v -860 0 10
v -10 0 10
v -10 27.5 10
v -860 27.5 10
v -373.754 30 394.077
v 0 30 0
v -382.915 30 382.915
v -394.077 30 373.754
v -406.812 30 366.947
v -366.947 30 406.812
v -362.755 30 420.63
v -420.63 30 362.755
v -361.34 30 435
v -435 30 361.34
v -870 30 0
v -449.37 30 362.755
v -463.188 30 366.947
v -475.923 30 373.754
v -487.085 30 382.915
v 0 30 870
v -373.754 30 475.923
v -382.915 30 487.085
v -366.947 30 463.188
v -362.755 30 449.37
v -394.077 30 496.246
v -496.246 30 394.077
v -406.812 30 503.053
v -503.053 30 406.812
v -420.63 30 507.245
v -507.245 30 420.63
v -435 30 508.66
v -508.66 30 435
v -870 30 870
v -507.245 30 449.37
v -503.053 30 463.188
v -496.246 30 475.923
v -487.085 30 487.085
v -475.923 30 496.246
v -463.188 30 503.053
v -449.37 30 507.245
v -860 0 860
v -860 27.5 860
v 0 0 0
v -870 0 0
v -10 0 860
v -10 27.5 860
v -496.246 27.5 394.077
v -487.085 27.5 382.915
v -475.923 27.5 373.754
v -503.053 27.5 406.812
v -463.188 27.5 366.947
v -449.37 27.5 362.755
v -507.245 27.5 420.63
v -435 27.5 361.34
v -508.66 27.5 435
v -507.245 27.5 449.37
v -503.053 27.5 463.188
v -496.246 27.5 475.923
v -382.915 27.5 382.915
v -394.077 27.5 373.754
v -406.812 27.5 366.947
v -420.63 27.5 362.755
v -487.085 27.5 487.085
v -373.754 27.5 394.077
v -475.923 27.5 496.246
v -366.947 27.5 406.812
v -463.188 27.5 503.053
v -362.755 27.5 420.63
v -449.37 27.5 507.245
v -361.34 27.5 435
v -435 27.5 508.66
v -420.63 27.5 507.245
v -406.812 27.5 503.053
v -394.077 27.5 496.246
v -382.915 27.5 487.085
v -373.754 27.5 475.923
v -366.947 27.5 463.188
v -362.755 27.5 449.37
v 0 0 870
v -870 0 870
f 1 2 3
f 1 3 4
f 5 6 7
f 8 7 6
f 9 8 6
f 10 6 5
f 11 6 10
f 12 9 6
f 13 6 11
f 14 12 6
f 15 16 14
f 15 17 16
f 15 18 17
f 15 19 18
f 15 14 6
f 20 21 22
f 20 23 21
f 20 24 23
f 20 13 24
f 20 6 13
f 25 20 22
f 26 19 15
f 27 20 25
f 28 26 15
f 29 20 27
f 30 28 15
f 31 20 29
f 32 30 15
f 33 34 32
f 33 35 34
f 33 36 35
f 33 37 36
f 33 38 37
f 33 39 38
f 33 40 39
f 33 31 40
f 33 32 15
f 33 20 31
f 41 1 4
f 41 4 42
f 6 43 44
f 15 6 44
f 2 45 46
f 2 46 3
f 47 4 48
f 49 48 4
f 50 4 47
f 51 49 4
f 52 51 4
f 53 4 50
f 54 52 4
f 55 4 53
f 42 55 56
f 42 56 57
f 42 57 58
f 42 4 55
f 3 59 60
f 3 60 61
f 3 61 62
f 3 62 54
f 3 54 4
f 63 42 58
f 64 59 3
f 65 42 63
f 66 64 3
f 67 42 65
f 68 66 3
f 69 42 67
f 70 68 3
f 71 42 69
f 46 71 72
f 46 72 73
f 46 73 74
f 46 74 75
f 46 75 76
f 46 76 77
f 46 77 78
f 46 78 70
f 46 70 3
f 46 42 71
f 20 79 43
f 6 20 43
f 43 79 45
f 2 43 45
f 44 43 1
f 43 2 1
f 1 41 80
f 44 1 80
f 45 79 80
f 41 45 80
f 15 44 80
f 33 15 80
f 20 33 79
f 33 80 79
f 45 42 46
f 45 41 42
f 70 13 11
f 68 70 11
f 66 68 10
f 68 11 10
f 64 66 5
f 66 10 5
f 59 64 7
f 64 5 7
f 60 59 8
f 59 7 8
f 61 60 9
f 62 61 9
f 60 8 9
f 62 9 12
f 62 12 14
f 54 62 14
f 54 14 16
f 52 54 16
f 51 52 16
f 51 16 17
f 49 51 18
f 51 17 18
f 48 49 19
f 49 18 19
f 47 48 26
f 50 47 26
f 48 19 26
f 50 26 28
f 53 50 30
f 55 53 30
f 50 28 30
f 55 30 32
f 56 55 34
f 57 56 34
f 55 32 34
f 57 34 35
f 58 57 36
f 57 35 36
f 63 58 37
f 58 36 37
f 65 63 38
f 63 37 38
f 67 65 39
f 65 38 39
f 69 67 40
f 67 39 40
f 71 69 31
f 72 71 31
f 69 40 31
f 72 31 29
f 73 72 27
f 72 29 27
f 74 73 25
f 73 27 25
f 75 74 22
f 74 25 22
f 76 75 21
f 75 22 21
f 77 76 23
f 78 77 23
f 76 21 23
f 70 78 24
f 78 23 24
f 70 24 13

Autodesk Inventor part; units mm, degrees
ref_plane "YZ Plane" through (0, 0, 0) normal (1, 0, 0) x (0, 1, 0)
ref_plane "XZ Plane" through (0, 0, 0) normal (0, 1, 0) x (-1, 0, 0)
ref_plane "XY Plane" through (0, 0, 0) normal (0, 0, 1) x (1, 0, 0)
sketch "Sketch1" plane through (0, 0, 0) normal (0, 1, 0) x (-1, 0, 0)
  line L0 (0, 0) -> (870, 0)
  line L1 (870, 0) -> (870, 870)
  line L2 (870, 870) -> (0, 870)
  line L3 (0, 870) -> (0, 0)
  dimension "d0" = 870
  dimension "d1" = 870
extrude "Extrusion1" add sketch "Sketch1" along normal blind 30
sketch "Sketch2" plane through (0, 0, 0) normal (0, -1, 0) x (1, 0, 0)
  line L0 (0, 0) -> (-870, 0) projected
  line L1 (0, 870) -> (0, 0) projected
  line L2 (-870, 870) -> (0, 870) projected
  line L3 (-870, 0) -> (-870, 870) projected
  line L4 (-10, 860) -> (-10, 10)
  line L5 (-10, 10) -> (-860, 10)
  line L6 (-860, 10) -> (-860, 860)
  line L7 (-860, 860) -> (-10, 860)
  dimension "d4" = 10
extrude "Extrusion2" cut sketch "Sketch2" against normal blind 27.5 contours L4 L5 L6 L7
sketch "Sketch3" plane through (0, 30, 0) normal (0, 1, 0) x (1, 0, 0)
  circle A0 centre (-435, -435) radius 73.66
  line L0 (0, 0) -> (-870, 0) projected
  line L1 (-870, 0) -> (-870, -870) projected
  line L2 (-870, -870) -> (0, -870) projected
  line L3 (0, -870) -> (0, 0) projected
  line L4 (-435, 0) -> (-435, -870) construction
  line L5 (-870, -435) -> (0, -435) construction
  point P0 (-435, -435)
  dimension "d7" = 147.32
extrude "Extrusion3" cut sketch "Sketch3" against normal blind 25.4 contours A0
properties part number "housingLid" material "Steel, Galvanized"
